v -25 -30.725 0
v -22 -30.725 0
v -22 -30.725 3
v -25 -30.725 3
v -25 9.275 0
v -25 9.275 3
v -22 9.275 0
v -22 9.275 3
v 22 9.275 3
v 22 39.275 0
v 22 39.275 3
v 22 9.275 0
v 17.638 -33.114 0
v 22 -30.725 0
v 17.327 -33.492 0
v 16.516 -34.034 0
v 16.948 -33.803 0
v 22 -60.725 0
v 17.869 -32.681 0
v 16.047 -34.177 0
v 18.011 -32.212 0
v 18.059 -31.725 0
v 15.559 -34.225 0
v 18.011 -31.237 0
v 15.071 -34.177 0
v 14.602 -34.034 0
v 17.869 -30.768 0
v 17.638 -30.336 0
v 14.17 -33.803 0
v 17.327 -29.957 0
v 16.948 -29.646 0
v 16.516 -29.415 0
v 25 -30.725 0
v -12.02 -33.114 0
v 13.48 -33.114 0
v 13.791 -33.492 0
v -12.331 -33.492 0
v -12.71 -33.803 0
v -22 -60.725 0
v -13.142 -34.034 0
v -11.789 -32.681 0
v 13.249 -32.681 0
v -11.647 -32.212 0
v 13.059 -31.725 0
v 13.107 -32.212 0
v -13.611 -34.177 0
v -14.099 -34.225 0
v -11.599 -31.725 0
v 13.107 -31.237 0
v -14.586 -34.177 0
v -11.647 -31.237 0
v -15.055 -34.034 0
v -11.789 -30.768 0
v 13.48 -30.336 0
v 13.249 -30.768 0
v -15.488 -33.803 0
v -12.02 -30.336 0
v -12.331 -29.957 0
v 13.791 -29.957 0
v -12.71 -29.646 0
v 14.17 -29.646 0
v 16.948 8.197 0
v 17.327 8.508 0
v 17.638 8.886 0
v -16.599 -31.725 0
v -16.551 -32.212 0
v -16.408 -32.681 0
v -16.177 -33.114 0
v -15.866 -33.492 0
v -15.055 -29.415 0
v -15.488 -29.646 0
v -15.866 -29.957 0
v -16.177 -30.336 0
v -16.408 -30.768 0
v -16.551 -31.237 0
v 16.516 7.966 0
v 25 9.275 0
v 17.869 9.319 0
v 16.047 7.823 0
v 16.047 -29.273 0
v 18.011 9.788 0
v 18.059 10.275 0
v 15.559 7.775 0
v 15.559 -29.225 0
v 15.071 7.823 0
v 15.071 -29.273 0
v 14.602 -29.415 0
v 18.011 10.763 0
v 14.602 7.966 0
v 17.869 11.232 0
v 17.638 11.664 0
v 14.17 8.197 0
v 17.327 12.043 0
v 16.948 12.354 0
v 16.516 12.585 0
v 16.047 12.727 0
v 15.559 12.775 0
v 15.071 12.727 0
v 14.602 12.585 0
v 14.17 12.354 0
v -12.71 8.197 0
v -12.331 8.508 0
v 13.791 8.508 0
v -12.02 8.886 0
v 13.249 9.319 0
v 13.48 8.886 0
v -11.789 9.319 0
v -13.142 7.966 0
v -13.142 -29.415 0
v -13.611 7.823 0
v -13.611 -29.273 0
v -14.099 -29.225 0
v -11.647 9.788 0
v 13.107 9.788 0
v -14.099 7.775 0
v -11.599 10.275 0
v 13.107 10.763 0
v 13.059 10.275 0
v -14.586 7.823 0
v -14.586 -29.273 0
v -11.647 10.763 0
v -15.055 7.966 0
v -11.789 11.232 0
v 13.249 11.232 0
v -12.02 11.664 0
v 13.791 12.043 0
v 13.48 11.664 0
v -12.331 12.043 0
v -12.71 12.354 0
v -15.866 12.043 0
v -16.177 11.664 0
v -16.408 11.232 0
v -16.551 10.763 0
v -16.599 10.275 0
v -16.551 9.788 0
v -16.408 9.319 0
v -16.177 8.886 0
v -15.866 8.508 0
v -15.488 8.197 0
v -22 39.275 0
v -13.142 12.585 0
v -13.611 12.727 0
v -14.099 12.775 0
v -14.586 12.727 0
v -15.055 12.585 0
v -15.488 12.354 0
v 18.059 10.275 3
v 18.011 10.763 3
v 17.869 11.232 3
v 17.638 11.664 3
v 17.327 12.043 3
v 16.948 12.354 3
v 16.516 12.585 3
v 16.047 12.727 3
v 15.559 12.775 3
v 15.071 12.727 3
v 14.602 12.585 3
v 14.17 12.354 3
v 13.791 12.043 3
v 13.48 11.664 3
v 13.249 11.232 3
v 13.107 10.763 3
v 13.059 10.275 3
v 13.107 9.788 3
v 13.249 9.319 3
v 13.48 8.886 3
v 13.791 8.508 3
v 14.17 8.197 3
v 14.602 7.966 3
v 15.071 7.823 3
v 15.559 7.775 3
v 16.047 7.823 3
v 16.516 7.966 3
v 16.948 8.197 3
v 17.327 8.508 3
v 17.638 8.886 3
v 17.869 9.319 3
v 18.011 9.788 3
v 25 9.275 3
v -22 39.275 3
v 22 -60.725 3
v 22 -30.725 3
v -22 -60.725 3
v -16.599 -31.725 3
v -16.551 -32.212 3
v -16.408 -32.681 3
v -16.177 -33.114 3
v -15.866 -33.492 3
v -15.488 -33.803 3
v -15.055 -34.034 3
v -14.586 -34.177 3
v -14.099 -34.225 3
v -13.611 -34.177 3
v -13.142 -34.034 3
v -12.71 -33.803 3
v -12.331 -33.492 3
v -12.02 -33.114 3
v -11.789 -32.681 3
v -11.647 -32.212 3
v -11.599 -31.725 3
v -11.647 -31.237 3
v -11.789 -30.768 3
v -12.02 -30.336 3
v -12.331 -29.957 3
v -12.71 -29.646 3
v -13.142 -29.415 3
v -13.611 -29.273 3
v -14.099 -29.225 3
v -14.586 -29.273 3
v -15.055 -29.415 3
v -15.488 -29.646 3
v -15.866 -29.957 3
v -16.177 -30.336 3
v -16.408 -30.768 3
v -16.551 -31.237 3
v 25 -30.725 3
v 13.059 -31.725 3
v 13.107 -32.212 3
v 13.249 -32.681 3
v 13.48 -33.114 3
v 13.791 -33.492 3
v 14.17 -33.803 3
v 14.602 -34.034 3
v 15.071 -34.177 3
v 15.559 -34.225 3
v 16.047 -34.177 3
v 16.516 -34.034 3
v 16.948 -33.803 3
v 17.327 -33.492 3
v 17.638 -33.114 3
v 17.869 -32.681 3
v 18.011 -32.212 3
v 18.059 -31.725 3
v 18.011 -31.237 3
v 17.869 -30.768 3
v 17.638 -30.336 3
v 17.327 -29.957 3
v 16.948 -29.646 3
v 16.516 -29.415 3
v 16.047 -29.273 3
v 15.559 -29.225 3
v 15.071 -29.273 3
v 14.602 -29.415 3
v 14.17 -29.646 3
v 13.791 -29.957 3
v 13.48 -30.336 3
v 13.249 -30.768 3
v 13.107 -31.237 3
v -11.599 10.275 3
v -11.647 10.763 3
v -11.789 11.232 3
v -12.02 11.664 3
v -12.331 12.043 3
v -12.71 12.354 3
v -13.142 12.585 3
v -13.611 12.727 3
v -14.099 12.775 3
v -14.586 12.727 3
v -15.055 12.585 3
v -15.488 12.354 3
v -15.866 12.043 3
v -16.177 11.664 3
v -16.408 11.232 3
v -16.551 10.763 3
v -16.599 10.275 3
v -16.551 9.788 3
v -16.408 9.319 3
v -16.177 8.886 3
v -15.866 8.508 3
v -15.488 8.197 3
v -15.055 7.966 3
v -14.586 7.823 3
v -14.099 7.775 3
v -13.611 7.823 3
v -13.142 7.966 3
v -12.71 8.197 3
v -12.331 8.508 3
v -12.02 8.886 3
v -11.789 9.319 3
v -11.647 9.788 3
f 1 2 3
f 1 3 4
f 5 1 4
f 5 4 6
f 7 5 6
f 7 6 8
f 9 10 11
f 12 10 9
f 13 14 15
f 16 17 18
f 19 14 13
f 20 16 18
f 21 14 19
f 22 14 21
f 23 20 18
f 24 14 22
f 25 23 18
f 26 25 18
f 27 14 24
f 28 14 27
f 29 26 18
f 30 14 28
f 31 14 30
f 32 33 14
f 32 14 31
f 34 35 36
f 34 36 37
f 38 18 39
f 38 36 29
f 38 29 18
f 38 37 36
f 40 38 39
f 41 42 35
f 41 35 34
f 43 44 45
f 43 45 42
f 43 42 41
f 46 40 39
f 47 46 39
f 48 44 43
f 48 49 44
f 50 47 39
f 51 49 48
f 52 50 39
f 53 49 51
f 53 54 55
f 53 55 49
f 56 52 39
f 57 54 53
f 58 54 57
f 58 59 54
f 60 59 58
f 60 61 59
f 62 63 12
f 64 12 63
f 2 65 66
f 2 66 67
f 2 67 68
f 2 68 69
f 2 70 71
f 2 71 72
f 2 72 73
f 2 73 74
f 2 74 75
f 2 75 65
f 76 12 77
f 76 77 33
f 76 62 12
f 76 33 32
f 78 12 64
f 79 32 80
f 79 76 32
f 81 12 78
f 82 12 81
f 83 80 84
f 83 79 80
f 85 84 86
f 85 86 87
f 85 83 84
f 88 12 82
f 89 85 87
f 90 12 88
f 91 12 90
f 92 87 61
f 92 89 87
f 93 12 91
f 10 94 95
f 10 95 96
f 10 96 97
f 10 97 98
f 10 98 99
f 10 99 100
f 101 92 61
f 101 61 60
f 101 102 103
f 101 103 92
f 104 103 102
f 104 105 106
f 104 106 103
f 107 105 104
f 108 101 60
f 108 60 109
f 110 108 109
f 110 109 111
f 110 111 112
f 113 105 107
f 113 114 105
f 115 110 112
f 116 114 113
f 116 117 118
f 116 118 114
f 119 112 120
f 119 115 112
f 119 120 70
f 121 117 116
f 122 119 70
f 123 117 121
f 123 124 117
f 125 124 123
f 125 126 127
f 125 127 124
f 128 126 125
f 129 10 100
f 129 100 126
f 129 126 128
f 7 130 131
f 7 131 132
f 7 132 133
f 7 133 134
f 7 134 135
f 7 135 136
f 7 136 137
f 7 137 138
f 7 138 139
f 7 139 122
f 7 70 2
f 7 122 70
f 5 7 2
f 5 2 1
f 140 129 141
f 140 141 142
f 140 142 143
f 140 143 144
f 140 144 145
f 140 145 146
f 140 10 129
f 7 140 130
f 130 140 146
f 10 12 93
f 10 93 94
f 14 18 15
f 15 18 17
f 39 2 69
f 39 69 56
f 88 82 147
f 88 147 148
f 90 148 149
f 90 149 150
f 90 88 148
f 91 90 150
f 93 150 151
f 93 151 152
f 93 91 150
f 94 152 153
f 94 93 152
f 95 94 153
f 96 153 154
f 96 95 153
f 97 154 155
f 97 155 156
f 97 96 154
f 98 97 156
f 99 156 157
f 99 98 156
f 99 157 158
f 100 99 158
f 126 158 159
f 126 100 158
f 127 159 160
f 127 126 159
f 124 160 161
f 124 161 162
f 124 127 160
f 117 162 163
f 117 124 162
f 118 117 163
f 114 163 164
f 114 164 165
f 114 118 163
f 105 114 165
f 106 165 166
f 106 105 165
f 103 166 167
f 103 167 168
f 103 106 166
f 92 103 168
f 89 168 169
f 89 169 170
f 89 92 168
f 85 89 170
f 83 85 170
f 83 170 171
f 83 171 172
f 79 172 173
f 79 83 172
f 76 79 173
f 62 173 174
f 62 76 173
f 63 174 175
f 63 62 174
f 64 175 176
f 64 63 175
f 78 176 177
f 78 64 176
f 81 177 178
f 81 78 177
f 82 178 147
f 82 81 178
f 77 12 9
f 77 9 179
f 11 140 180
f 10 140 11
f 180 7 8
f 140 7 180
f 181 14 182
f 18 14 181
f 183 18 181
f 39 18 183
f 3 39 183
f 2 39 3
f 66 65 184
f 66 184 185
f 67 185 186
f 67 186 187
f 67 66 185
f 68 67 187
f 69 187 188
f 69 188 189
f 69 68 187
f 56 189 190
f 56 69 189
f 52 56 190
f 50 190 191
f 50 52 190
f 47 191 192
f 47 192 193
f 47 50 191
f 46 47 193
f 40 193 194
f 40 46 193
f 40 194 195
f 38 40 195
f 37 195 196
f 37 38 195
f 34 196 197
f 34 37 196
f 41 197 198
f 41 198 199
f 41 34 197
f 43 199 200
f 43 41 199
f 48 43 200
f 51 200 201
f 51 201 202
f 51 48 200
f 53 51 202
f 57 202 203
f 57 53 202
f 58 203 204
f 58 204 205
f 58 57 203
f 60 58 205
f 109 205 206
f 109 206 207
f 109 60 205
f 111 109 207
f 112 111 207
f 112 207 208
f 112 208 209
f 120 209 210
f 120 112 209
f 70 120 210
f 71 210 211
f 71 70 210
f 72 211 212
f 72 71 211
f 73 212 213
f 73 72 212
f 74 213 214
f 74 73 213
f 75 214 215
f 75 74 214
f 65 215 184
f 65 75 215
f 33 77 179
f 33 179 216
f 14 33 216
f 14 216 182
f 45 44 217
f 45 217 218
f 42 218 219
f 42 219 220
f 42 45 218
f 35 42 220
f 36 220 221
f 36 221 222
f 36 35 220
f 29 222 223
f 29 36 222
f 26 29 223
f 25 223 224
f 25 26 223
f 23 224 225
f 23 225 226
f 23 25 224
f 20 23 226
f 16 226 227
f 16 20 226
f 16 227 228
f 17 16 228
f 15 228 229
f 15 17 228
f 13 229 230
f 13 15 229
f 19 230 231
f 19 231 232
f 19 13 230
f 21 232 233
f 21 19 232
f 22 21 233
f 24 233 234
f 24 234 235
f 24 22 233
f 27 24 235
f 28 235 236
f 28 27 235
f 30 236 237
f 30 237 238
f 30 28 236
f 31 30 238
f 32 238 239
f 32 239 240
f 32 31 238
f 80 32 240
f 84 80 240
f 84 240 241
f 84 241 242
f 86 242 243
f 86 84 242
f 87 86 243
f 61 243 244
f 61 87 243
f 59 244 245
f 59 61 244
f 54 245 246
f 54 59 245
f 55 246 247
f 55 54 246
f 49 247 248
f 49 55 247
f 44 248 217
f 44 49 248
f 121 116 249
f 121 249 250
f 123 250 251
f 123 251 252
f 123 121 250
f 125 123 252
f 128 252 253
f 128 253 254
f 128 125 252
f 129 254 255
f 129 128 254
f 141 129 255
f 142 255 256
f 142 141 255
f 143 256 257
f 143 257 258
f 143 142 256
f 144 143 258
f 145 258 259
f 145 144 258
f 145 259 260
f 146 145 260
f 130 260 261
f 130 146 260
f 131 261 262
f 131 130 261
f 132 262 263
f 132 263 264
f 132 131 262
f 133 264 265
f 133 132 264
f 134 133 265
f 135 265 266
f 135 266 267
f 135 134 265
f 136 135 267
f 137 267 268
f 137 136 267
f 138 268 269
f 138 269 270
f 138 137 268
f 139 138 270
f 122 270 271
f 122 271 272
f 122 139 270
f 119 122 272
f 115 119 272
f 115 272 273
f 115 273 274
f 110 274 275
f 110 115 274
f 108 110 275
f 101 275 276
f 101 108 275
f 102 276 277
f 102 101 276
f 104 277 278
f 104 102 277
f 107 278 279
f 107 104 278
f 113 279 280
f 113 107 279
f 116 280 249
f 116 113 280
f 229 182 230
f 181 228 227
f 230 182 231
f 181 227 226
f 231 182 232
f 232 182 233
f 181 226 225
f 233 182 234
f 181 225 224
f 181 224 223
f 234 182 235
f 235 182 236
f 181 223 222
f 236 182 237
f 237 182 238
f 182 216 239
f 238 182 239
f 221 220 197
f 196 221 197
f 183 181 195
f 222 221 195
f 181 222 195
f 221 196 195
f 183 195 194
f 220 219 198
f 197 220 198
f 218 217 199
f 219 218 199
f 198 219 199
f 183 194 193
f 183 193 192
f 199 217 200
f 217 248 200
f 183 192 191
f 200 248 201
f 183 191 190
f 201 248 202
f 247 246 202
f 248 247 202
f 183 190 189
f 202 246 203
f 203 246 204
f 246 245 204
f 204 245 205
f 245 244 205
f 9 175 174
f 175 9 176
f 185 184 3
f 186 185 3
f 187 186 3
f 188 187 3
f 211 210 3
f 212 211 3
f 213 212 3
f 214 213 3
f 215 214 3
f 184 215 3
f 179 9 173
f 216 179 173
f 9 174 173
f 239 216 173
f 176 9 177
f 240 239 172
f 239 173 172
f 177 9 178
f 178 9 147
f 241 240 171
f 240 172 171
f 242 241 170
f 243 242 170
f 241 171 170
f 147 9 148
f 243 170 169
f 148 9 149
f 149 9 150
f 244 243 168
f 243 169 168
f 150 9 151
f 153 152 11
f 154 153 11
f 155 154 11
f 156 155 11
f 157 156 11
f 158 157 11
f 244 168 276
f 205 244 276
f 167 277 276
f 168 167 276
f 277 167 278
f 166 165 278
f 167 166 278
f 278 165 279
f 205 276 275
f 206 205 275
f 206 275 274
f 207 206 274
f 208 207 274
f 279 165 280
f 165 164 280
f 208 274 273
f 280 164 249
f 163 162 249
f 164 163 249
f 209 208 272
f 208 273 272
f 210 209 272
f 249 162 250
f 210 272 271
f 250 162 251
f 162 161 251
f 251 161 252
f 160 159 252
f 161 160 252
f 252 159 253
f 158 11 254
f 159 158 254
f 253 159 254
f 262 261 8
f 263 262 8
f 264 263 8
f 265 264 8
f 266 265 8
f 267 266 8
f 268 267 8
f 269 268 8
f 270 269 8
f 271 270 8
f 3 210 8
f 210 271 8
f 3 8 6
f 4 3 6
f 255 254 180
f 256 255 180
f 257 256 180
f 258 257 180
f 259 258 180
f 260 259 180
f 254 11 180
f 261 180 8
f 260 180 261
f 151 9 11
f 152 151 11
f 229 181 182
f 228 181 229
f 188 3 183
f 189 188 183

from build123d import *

# Parameters (mm, degrees)
SKETCH1_R           = 2.5
BOSS_EXTRUDE1_DEPTH = 3


with BuildPart() as part:
    # Sketch1 → Boss-Extrude1 (new body)
    with BuildSketch(Plane.XY):
        Polygon((-25, 9.275362319), (-22, 9.275362319), (-22, 39.275362319), (22, 39.275362319), (22, 9.275362319), (25, 9.275362319), (25, -30.724637681), (22, -30.724637681), (22, -60.724637681), (-22, -60.724637681), (-22, -30.724637681), (-25, -30.724637681), align=None)
        with Locations((15.558956534, 10.275362319)):
            Circle(SKETCH1_R, mode=Mode.SUBTRACT)
        with Locations((-14.098613638, 10.275362319)):
            Circle(SKETCH1_R, mode=Mode.SUBTRACT)
        with Locations(Location((15.558956534, -31.724637681, 0), (0, 0, 180))):
            Circle(SKETCH1_R, mode=Mode.SUBTRACT)
        with Locations(Location((-14.098613638, -31.724637681, 0), (0, 0, 180))):
            Circle(SKETCH1_R, mode=Mode.SUBTRACT)
    extrude(amount=BOSS_EXTRUDE1_DEPTH)


solid = part.part
